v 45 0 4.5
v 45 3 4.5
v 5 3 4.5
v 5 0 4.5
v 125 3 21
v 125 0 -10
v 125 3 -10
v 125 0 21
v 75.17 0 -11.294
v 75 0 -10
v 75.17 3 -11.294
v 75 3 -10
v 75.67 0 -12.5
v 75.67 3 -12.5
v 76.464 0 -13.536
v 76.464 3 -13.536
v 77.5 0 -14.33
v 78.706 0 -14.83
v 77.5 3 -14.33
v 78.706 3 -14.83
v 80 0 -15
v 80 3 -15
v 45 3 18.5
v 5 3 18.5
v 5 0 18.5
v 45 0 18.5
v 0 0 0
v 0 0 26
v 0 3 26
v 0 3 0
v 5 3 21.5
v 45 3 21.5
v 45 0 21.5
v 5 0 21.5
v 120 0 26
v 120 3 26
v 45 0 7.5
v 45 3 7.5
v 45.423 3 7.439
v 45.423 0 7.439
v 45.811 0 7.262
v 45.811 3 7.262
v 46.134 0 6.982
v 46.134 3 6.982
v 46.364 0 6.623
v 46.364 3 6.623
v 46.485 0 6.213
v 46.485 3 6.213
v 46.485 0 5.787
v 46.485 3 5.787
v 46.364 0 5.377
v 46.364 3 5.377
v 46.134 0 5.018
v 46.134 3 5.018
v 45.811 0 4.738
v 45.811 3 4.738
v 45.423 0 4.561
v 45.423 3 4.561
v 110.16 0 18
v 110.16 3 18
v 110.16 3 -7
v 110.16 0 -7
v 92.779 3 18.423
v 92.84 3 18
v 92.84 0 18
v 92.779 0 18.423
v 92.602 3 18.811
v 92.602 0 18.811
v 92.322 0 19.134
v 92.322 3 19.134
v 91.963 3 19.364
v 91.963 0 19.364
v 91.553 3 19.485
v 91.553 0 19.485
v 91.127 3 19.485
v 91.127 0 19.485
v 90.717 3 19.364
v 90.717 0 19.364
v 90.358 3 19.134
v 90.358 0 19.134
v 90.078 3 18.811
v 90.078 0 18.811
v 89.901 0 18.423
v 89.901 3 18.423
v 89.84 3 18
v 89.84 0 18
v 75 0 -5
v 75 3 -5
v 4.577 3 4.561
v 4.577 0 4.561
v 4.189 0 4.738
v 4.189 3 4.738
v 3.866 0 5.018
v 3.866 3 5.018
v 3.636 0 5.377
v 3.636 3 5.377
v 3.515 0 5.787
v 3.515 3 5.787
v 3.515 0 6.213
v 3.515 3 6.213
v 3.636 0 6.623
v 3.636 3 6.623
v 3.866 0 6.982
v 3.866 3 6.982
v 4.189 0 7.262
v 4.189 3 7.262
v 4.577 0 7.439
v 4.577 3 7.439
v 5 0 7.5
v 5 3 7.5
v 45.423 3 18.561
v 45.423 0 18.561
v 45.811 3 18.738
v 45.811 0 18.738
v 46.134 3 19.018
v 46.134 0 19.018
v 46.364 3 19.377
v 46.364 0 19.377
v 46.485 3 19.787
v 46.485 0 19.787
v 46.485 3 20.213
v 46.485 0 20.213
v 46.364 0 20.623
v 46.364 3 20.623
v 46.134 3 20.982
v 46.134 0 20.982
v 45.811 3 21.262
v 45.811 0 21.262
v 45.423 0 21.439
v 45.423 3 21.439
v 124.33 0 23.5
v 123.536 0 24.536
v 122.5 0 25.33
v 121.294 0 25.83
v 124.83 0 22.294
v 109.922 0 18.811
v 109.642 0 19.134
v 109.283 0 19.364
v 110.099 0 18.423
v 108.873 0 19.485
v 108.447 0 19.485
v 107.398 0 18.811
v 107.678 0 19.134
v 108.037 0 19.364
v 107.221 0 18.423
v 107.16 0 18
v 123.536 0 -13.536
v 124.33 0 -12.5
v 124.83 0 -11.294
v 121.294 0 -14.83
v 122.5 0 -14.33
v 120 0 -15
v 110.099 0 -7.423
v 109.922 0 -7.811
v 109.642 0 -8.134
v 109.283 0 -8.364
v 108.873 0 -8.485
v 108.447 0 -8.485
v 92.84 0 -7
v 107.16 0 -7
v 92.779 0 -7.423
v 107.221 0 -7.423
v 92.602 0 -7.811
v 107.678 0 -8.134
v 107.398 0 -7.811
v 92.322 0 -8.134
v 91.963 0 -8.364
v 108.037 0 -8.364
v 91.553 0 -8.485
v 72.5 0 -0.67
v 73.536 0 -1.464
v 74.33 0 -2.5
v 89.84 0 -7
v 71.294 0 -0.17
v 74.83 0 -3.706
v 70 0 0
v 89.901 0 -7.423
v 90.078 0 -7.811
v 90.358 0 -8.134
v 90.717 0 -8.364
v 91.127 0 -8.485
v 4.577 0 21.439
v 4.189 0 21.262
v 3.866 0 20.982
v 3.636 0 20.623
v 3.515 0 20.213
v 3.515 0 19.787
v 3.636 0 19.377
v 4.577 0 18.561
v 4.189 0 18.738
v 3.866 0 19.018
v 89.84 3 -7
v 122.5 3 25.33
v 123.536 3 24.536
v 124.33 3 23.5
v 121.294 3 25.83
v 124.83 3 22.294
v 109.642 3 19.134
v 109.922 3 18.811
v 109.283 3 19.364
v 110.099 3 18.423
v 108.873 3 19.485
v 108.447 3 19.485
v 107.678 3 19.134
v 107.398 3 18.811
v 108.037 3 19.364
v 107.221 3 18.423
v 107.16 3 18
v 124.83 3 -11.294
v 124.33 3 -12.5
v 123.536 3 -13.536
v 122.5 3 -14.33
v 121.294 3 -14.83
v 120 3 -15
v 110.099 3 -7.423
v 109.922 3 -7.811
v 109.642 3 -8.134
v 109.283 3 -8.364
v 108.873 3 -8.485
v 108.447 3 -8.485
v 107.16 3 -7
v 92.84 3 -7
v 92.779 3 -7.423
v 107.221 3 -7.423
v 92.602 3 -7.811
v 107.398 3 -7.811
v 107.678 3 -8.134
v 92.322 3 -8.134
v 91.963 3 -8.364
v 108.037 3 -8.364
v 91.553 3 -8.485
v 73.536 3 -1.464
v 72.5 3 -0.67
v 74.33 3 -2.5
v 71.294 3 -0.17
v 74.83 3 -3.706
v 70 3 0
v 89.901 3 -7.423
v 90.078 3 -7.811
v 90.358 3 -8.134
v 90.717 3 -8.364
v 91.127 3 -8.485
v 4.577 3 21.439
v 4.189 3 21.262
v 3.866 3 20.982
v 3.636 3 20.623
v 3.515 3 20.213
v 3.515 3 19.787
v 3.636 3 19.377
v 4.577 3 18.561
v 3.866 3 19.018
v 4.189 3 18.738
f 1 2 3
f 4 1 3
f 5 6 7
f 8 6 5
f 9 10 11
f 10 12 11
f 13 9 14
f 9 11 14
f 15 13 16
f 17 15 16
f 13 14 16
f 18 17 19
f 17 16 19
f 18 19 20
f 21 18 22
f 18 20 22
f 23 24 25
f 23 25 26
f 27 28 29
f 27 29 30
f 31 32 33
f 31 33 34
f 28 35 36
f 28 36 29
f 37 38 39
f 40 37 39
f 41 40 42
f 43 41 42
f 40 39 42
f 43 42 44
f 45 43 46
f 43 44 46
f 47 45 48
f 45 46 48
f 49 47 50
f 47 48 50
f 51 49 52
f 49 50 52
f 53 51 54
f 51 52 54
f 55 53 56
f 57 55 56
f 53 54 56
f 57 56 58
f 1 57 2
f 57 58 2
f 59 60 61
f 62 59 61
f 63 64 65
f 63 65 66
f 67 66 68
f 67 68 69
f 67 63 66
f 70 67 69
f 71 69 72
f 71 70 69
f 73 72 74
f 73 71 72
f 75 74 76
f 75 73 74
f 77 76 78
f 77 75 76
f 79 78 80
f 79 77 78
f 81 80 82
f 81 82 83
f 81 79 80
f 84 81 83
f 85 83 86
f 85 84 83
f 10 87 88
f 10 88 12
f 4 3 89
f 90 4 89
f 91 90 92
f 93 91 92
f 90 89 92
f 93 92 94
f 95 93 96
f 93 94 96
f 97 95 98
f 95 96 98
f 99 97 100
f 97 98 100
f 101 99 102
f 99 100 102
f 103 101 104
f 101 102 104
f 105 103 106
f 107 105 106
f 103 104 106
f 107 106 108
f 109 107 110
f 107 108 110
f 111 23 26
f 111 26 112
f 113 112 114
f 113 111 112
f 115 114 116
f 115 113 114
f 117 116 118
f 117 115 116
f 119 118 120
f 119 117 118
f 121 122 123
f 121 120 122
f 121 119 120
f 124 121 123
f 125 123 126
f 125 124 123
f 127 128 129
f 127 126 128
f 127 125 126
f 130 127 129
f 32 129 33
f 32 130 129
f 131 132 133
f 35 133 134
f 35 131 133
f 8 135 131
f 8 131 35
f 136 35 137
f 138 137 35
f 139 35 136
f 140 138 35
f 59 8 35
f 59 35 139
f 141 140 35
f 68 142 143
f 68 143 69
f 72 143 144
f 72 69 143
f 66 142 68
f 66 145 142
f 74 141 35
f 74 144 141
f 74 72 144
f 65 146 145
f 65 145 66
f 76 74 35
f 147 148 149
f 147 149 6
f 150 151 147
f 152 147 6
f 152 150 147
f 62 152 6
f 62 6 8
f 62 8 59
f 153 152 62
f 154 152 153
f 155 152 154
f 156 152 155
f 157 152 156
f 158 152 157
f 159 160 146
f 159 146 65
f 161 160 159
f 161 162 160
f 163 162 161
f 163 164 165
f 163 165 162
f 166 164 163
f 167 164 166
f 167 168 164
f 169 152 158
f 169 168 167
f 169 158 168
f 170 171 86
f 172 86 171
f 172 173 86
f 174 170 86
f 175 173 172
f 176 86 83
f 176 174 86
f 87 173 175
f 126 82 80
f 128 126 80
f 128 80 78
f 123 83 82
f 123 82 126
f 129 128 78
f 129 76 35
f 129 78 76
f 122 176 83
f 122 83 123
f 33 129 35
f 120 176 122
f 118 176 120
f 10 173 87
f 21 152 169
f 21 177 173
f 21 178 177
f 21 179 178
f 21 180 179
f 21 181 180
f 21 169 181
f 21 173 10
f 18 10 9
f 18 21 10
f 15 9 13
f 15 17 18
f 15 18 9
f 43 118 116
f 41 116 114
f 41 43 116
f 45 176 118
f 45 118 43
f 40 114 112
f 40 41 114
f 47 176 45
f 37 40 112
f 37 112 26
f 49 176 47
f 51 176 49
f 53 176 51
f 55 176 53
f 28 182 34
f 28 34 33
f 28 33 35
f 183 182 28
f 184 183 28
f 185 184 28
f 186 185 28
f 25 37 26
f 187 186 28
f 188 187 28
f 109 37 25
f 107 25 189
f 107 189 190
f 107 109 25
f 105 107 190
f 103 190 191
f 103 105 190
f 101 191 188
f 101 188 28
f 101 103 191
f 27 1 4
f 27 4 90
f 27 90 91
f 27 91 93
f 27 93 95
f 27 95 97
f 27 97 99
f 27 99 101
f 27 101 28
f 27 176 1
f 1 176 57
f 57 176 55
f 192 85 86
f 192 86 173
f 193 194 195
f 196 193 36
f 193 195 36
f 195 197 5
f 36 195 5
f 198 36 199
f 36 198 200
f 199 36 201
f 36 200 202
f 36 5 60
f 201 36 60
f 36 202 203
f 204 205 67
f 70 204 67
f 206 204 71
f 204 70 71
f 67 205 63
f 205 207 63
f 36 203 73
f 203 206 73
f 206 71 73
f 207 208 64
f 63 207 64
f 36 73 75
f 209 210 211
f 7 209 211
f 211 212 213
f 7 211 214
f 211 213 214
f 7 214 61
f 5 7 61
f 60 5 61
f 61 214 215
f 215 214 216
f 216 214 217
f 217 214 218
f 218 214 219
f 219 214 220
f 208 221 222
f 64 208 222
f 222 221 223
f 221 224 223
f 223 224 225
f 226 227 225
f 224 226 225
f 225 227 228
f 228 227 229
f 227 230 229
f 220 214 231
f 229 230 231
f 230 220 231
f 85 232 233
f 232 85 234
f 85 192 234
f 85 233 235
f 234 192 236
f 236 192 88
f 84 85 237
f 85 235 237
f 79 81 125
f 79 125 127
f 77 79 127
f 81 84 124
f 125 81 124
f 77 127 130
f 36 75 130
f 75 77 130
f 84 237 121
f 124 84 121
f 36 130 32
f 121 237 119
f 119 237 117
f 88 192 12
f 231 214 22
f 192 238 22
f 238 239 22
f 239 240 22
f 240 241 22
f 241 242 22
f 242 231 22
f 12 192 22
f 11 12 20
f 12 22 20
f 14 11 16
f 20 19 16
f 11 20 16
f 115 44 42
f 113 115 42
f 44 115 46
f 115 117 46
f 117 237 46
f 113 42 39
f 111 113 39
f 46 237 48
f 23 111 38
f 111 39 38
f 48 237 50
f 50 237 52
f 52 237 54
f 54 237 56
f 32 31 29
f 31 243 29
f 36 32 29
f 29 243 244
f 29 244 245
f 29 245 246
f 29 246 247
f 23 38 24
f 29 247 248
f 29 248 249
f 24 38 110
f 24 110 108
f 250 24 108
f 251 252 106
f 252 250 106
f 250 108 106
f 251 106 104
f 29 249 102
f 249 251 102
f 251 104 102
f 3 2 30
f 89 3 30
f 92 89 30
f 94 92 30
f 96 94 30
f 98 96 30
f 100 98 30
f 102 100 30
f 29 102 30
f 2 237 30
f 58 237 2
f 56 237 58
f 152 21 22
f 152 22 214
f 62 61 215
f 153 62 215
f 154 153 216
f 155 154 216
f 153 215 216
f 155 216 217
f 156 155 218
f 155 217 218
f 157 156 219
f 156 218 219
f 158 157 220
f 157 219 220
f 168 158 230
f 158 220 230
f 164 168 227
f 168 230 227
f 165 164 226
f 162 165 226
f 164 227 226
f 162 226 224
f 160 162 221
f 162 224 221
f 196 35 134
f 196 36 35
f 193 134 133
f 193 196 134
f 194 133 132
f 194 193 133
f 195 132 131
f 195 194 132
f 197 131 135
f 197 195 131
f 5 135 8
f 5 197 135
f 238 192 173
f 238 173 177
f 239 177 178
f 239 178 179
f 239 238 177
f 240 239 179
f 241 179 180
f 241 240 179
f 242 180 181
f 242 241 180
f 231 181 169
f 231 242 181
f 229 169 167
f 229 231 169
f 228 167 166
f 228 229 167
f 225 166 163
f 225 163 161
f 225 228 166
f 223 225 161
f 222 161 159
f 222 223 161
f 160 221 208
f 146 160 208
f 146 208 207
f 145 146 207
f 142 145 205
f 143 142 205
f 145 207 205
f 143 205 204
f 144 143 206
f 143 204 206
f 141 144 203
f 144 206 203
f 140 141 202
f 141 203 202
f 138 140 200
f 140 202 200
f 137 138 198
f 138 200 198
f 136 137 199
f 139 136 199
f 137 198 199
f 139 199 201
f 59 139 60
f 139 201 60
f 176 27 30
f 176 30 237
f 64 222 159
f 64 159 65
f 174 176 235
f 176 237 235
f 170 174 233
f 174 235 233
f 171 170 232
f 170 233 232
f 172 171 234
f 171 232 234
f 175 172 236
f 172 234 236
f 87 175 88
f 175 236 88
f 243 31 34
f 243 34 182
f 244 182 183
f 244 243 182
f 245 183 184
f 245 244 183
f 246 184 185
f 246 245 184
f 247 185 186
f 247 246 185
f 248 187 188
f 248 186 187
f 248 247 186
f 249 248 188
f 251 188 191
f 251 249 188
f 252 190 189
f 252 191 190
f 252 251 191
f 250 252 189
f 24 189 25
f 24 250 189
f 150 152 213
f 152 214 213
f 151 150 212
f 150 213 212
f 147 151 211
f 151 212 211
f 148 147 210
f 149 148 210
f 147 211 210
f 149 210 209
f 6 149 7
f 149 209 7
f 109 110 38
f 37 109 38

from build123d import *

# Parameters (mm, degrees)
BOSS_EXTRUDE1_DEPTH = 3
CUT_EXTRUDE1_DEPTH  = 3
FILLET1_R           = 5
CUT_EXTRUDE2_DEPTH  = 128.710610366


with BuildPart() as part:
    # Sketch1 → Boss-Extrude1 (new body)
    with BuildSketch(Plane(origin=(0, 0, 0), x_dir=(1, 0, 0), z_dir=(0, 1, 0))):
        Polygon((0, 0), (75, 0), (75, 15), (125, 15), (125, -26), (0, -26), align=None)
    extrude(amount=BOSS_EXTRUDE1_DEPTH)

    # Sketch2 → Cut-Extrude1 (cut)
    with BuildSketch(Plane(origin=(0, 3, 0), x_dir=(1, 0, 0), z_dir=(0, 1, 0))):
        with BuildLine():
            Line((92.84, 7), (92.84, -18))
            ThreePointArc((92.84, -18), (91.34, -19.5), (89.84, -18))
            Line((89.84, -18), (89.84, 7))
            ThreePointArc((89.84, 7), (91.34, 8.5), (92.84, 7))
        make_face()
        with BuildLine():
            Line((107.16, 7), (107.16, -18))
            ThreePointArc((107.16, -18), (108.66, -19.5), (110.16, -18))
            Line((110.16, -18), (110.16, 7))
            ThreePointArc((110.16, 7), (108.66, 8.5), (107.16, 7))
        make_face()
    extrude(amount=-CUT_EXTRUDE1_DEPTH, mode=Mode.SUBTRACT)

    # Fillet1
    fillet1_edges = [part.edges().sort_by_distance(p)[0] for p in [
        (75, 1.5, 0),
        (75, 1.5, -15),
        (125, 1.5, -15),
        (125, 1.5, 26),
    ]]
    fillet(fillet1_edges, radius=FILLET1_R)

    # Sketch4 → Cut-Extrude2 (cut, through all)
    with BuildSketch(Plane(origin=(0, 3, 0), x_dir=(1, 0, 0), z_dir=(0, 1, 0))):
        with BuildLine():
            Line((45, -21.5), (5, -21.5))
            ThreePointArc((5, -21.5), (3.5, -20), (5, -18.5))
            Line((5, -18.5), (45, -18.5))
            ThreePointArc((45, -18.5), (46.5, -20), (45, -21.5))
        make_face()
        with BuildLine():
            Line((45, -4.5), (5, -4.5))
            ThreePointArc((5, -4.5), (3.5, -6), (5, -7.5))
            Line((5, -7.5), (45, -7.5))
            ThreePointArc((45, -7.5), (46.5, -6), (45, -4.5))
        make_face()
    extrude(amount=-CUT_EXTRUDE2_DEPTH, mode=Mode.SUBTRACT)


solid = part.part
